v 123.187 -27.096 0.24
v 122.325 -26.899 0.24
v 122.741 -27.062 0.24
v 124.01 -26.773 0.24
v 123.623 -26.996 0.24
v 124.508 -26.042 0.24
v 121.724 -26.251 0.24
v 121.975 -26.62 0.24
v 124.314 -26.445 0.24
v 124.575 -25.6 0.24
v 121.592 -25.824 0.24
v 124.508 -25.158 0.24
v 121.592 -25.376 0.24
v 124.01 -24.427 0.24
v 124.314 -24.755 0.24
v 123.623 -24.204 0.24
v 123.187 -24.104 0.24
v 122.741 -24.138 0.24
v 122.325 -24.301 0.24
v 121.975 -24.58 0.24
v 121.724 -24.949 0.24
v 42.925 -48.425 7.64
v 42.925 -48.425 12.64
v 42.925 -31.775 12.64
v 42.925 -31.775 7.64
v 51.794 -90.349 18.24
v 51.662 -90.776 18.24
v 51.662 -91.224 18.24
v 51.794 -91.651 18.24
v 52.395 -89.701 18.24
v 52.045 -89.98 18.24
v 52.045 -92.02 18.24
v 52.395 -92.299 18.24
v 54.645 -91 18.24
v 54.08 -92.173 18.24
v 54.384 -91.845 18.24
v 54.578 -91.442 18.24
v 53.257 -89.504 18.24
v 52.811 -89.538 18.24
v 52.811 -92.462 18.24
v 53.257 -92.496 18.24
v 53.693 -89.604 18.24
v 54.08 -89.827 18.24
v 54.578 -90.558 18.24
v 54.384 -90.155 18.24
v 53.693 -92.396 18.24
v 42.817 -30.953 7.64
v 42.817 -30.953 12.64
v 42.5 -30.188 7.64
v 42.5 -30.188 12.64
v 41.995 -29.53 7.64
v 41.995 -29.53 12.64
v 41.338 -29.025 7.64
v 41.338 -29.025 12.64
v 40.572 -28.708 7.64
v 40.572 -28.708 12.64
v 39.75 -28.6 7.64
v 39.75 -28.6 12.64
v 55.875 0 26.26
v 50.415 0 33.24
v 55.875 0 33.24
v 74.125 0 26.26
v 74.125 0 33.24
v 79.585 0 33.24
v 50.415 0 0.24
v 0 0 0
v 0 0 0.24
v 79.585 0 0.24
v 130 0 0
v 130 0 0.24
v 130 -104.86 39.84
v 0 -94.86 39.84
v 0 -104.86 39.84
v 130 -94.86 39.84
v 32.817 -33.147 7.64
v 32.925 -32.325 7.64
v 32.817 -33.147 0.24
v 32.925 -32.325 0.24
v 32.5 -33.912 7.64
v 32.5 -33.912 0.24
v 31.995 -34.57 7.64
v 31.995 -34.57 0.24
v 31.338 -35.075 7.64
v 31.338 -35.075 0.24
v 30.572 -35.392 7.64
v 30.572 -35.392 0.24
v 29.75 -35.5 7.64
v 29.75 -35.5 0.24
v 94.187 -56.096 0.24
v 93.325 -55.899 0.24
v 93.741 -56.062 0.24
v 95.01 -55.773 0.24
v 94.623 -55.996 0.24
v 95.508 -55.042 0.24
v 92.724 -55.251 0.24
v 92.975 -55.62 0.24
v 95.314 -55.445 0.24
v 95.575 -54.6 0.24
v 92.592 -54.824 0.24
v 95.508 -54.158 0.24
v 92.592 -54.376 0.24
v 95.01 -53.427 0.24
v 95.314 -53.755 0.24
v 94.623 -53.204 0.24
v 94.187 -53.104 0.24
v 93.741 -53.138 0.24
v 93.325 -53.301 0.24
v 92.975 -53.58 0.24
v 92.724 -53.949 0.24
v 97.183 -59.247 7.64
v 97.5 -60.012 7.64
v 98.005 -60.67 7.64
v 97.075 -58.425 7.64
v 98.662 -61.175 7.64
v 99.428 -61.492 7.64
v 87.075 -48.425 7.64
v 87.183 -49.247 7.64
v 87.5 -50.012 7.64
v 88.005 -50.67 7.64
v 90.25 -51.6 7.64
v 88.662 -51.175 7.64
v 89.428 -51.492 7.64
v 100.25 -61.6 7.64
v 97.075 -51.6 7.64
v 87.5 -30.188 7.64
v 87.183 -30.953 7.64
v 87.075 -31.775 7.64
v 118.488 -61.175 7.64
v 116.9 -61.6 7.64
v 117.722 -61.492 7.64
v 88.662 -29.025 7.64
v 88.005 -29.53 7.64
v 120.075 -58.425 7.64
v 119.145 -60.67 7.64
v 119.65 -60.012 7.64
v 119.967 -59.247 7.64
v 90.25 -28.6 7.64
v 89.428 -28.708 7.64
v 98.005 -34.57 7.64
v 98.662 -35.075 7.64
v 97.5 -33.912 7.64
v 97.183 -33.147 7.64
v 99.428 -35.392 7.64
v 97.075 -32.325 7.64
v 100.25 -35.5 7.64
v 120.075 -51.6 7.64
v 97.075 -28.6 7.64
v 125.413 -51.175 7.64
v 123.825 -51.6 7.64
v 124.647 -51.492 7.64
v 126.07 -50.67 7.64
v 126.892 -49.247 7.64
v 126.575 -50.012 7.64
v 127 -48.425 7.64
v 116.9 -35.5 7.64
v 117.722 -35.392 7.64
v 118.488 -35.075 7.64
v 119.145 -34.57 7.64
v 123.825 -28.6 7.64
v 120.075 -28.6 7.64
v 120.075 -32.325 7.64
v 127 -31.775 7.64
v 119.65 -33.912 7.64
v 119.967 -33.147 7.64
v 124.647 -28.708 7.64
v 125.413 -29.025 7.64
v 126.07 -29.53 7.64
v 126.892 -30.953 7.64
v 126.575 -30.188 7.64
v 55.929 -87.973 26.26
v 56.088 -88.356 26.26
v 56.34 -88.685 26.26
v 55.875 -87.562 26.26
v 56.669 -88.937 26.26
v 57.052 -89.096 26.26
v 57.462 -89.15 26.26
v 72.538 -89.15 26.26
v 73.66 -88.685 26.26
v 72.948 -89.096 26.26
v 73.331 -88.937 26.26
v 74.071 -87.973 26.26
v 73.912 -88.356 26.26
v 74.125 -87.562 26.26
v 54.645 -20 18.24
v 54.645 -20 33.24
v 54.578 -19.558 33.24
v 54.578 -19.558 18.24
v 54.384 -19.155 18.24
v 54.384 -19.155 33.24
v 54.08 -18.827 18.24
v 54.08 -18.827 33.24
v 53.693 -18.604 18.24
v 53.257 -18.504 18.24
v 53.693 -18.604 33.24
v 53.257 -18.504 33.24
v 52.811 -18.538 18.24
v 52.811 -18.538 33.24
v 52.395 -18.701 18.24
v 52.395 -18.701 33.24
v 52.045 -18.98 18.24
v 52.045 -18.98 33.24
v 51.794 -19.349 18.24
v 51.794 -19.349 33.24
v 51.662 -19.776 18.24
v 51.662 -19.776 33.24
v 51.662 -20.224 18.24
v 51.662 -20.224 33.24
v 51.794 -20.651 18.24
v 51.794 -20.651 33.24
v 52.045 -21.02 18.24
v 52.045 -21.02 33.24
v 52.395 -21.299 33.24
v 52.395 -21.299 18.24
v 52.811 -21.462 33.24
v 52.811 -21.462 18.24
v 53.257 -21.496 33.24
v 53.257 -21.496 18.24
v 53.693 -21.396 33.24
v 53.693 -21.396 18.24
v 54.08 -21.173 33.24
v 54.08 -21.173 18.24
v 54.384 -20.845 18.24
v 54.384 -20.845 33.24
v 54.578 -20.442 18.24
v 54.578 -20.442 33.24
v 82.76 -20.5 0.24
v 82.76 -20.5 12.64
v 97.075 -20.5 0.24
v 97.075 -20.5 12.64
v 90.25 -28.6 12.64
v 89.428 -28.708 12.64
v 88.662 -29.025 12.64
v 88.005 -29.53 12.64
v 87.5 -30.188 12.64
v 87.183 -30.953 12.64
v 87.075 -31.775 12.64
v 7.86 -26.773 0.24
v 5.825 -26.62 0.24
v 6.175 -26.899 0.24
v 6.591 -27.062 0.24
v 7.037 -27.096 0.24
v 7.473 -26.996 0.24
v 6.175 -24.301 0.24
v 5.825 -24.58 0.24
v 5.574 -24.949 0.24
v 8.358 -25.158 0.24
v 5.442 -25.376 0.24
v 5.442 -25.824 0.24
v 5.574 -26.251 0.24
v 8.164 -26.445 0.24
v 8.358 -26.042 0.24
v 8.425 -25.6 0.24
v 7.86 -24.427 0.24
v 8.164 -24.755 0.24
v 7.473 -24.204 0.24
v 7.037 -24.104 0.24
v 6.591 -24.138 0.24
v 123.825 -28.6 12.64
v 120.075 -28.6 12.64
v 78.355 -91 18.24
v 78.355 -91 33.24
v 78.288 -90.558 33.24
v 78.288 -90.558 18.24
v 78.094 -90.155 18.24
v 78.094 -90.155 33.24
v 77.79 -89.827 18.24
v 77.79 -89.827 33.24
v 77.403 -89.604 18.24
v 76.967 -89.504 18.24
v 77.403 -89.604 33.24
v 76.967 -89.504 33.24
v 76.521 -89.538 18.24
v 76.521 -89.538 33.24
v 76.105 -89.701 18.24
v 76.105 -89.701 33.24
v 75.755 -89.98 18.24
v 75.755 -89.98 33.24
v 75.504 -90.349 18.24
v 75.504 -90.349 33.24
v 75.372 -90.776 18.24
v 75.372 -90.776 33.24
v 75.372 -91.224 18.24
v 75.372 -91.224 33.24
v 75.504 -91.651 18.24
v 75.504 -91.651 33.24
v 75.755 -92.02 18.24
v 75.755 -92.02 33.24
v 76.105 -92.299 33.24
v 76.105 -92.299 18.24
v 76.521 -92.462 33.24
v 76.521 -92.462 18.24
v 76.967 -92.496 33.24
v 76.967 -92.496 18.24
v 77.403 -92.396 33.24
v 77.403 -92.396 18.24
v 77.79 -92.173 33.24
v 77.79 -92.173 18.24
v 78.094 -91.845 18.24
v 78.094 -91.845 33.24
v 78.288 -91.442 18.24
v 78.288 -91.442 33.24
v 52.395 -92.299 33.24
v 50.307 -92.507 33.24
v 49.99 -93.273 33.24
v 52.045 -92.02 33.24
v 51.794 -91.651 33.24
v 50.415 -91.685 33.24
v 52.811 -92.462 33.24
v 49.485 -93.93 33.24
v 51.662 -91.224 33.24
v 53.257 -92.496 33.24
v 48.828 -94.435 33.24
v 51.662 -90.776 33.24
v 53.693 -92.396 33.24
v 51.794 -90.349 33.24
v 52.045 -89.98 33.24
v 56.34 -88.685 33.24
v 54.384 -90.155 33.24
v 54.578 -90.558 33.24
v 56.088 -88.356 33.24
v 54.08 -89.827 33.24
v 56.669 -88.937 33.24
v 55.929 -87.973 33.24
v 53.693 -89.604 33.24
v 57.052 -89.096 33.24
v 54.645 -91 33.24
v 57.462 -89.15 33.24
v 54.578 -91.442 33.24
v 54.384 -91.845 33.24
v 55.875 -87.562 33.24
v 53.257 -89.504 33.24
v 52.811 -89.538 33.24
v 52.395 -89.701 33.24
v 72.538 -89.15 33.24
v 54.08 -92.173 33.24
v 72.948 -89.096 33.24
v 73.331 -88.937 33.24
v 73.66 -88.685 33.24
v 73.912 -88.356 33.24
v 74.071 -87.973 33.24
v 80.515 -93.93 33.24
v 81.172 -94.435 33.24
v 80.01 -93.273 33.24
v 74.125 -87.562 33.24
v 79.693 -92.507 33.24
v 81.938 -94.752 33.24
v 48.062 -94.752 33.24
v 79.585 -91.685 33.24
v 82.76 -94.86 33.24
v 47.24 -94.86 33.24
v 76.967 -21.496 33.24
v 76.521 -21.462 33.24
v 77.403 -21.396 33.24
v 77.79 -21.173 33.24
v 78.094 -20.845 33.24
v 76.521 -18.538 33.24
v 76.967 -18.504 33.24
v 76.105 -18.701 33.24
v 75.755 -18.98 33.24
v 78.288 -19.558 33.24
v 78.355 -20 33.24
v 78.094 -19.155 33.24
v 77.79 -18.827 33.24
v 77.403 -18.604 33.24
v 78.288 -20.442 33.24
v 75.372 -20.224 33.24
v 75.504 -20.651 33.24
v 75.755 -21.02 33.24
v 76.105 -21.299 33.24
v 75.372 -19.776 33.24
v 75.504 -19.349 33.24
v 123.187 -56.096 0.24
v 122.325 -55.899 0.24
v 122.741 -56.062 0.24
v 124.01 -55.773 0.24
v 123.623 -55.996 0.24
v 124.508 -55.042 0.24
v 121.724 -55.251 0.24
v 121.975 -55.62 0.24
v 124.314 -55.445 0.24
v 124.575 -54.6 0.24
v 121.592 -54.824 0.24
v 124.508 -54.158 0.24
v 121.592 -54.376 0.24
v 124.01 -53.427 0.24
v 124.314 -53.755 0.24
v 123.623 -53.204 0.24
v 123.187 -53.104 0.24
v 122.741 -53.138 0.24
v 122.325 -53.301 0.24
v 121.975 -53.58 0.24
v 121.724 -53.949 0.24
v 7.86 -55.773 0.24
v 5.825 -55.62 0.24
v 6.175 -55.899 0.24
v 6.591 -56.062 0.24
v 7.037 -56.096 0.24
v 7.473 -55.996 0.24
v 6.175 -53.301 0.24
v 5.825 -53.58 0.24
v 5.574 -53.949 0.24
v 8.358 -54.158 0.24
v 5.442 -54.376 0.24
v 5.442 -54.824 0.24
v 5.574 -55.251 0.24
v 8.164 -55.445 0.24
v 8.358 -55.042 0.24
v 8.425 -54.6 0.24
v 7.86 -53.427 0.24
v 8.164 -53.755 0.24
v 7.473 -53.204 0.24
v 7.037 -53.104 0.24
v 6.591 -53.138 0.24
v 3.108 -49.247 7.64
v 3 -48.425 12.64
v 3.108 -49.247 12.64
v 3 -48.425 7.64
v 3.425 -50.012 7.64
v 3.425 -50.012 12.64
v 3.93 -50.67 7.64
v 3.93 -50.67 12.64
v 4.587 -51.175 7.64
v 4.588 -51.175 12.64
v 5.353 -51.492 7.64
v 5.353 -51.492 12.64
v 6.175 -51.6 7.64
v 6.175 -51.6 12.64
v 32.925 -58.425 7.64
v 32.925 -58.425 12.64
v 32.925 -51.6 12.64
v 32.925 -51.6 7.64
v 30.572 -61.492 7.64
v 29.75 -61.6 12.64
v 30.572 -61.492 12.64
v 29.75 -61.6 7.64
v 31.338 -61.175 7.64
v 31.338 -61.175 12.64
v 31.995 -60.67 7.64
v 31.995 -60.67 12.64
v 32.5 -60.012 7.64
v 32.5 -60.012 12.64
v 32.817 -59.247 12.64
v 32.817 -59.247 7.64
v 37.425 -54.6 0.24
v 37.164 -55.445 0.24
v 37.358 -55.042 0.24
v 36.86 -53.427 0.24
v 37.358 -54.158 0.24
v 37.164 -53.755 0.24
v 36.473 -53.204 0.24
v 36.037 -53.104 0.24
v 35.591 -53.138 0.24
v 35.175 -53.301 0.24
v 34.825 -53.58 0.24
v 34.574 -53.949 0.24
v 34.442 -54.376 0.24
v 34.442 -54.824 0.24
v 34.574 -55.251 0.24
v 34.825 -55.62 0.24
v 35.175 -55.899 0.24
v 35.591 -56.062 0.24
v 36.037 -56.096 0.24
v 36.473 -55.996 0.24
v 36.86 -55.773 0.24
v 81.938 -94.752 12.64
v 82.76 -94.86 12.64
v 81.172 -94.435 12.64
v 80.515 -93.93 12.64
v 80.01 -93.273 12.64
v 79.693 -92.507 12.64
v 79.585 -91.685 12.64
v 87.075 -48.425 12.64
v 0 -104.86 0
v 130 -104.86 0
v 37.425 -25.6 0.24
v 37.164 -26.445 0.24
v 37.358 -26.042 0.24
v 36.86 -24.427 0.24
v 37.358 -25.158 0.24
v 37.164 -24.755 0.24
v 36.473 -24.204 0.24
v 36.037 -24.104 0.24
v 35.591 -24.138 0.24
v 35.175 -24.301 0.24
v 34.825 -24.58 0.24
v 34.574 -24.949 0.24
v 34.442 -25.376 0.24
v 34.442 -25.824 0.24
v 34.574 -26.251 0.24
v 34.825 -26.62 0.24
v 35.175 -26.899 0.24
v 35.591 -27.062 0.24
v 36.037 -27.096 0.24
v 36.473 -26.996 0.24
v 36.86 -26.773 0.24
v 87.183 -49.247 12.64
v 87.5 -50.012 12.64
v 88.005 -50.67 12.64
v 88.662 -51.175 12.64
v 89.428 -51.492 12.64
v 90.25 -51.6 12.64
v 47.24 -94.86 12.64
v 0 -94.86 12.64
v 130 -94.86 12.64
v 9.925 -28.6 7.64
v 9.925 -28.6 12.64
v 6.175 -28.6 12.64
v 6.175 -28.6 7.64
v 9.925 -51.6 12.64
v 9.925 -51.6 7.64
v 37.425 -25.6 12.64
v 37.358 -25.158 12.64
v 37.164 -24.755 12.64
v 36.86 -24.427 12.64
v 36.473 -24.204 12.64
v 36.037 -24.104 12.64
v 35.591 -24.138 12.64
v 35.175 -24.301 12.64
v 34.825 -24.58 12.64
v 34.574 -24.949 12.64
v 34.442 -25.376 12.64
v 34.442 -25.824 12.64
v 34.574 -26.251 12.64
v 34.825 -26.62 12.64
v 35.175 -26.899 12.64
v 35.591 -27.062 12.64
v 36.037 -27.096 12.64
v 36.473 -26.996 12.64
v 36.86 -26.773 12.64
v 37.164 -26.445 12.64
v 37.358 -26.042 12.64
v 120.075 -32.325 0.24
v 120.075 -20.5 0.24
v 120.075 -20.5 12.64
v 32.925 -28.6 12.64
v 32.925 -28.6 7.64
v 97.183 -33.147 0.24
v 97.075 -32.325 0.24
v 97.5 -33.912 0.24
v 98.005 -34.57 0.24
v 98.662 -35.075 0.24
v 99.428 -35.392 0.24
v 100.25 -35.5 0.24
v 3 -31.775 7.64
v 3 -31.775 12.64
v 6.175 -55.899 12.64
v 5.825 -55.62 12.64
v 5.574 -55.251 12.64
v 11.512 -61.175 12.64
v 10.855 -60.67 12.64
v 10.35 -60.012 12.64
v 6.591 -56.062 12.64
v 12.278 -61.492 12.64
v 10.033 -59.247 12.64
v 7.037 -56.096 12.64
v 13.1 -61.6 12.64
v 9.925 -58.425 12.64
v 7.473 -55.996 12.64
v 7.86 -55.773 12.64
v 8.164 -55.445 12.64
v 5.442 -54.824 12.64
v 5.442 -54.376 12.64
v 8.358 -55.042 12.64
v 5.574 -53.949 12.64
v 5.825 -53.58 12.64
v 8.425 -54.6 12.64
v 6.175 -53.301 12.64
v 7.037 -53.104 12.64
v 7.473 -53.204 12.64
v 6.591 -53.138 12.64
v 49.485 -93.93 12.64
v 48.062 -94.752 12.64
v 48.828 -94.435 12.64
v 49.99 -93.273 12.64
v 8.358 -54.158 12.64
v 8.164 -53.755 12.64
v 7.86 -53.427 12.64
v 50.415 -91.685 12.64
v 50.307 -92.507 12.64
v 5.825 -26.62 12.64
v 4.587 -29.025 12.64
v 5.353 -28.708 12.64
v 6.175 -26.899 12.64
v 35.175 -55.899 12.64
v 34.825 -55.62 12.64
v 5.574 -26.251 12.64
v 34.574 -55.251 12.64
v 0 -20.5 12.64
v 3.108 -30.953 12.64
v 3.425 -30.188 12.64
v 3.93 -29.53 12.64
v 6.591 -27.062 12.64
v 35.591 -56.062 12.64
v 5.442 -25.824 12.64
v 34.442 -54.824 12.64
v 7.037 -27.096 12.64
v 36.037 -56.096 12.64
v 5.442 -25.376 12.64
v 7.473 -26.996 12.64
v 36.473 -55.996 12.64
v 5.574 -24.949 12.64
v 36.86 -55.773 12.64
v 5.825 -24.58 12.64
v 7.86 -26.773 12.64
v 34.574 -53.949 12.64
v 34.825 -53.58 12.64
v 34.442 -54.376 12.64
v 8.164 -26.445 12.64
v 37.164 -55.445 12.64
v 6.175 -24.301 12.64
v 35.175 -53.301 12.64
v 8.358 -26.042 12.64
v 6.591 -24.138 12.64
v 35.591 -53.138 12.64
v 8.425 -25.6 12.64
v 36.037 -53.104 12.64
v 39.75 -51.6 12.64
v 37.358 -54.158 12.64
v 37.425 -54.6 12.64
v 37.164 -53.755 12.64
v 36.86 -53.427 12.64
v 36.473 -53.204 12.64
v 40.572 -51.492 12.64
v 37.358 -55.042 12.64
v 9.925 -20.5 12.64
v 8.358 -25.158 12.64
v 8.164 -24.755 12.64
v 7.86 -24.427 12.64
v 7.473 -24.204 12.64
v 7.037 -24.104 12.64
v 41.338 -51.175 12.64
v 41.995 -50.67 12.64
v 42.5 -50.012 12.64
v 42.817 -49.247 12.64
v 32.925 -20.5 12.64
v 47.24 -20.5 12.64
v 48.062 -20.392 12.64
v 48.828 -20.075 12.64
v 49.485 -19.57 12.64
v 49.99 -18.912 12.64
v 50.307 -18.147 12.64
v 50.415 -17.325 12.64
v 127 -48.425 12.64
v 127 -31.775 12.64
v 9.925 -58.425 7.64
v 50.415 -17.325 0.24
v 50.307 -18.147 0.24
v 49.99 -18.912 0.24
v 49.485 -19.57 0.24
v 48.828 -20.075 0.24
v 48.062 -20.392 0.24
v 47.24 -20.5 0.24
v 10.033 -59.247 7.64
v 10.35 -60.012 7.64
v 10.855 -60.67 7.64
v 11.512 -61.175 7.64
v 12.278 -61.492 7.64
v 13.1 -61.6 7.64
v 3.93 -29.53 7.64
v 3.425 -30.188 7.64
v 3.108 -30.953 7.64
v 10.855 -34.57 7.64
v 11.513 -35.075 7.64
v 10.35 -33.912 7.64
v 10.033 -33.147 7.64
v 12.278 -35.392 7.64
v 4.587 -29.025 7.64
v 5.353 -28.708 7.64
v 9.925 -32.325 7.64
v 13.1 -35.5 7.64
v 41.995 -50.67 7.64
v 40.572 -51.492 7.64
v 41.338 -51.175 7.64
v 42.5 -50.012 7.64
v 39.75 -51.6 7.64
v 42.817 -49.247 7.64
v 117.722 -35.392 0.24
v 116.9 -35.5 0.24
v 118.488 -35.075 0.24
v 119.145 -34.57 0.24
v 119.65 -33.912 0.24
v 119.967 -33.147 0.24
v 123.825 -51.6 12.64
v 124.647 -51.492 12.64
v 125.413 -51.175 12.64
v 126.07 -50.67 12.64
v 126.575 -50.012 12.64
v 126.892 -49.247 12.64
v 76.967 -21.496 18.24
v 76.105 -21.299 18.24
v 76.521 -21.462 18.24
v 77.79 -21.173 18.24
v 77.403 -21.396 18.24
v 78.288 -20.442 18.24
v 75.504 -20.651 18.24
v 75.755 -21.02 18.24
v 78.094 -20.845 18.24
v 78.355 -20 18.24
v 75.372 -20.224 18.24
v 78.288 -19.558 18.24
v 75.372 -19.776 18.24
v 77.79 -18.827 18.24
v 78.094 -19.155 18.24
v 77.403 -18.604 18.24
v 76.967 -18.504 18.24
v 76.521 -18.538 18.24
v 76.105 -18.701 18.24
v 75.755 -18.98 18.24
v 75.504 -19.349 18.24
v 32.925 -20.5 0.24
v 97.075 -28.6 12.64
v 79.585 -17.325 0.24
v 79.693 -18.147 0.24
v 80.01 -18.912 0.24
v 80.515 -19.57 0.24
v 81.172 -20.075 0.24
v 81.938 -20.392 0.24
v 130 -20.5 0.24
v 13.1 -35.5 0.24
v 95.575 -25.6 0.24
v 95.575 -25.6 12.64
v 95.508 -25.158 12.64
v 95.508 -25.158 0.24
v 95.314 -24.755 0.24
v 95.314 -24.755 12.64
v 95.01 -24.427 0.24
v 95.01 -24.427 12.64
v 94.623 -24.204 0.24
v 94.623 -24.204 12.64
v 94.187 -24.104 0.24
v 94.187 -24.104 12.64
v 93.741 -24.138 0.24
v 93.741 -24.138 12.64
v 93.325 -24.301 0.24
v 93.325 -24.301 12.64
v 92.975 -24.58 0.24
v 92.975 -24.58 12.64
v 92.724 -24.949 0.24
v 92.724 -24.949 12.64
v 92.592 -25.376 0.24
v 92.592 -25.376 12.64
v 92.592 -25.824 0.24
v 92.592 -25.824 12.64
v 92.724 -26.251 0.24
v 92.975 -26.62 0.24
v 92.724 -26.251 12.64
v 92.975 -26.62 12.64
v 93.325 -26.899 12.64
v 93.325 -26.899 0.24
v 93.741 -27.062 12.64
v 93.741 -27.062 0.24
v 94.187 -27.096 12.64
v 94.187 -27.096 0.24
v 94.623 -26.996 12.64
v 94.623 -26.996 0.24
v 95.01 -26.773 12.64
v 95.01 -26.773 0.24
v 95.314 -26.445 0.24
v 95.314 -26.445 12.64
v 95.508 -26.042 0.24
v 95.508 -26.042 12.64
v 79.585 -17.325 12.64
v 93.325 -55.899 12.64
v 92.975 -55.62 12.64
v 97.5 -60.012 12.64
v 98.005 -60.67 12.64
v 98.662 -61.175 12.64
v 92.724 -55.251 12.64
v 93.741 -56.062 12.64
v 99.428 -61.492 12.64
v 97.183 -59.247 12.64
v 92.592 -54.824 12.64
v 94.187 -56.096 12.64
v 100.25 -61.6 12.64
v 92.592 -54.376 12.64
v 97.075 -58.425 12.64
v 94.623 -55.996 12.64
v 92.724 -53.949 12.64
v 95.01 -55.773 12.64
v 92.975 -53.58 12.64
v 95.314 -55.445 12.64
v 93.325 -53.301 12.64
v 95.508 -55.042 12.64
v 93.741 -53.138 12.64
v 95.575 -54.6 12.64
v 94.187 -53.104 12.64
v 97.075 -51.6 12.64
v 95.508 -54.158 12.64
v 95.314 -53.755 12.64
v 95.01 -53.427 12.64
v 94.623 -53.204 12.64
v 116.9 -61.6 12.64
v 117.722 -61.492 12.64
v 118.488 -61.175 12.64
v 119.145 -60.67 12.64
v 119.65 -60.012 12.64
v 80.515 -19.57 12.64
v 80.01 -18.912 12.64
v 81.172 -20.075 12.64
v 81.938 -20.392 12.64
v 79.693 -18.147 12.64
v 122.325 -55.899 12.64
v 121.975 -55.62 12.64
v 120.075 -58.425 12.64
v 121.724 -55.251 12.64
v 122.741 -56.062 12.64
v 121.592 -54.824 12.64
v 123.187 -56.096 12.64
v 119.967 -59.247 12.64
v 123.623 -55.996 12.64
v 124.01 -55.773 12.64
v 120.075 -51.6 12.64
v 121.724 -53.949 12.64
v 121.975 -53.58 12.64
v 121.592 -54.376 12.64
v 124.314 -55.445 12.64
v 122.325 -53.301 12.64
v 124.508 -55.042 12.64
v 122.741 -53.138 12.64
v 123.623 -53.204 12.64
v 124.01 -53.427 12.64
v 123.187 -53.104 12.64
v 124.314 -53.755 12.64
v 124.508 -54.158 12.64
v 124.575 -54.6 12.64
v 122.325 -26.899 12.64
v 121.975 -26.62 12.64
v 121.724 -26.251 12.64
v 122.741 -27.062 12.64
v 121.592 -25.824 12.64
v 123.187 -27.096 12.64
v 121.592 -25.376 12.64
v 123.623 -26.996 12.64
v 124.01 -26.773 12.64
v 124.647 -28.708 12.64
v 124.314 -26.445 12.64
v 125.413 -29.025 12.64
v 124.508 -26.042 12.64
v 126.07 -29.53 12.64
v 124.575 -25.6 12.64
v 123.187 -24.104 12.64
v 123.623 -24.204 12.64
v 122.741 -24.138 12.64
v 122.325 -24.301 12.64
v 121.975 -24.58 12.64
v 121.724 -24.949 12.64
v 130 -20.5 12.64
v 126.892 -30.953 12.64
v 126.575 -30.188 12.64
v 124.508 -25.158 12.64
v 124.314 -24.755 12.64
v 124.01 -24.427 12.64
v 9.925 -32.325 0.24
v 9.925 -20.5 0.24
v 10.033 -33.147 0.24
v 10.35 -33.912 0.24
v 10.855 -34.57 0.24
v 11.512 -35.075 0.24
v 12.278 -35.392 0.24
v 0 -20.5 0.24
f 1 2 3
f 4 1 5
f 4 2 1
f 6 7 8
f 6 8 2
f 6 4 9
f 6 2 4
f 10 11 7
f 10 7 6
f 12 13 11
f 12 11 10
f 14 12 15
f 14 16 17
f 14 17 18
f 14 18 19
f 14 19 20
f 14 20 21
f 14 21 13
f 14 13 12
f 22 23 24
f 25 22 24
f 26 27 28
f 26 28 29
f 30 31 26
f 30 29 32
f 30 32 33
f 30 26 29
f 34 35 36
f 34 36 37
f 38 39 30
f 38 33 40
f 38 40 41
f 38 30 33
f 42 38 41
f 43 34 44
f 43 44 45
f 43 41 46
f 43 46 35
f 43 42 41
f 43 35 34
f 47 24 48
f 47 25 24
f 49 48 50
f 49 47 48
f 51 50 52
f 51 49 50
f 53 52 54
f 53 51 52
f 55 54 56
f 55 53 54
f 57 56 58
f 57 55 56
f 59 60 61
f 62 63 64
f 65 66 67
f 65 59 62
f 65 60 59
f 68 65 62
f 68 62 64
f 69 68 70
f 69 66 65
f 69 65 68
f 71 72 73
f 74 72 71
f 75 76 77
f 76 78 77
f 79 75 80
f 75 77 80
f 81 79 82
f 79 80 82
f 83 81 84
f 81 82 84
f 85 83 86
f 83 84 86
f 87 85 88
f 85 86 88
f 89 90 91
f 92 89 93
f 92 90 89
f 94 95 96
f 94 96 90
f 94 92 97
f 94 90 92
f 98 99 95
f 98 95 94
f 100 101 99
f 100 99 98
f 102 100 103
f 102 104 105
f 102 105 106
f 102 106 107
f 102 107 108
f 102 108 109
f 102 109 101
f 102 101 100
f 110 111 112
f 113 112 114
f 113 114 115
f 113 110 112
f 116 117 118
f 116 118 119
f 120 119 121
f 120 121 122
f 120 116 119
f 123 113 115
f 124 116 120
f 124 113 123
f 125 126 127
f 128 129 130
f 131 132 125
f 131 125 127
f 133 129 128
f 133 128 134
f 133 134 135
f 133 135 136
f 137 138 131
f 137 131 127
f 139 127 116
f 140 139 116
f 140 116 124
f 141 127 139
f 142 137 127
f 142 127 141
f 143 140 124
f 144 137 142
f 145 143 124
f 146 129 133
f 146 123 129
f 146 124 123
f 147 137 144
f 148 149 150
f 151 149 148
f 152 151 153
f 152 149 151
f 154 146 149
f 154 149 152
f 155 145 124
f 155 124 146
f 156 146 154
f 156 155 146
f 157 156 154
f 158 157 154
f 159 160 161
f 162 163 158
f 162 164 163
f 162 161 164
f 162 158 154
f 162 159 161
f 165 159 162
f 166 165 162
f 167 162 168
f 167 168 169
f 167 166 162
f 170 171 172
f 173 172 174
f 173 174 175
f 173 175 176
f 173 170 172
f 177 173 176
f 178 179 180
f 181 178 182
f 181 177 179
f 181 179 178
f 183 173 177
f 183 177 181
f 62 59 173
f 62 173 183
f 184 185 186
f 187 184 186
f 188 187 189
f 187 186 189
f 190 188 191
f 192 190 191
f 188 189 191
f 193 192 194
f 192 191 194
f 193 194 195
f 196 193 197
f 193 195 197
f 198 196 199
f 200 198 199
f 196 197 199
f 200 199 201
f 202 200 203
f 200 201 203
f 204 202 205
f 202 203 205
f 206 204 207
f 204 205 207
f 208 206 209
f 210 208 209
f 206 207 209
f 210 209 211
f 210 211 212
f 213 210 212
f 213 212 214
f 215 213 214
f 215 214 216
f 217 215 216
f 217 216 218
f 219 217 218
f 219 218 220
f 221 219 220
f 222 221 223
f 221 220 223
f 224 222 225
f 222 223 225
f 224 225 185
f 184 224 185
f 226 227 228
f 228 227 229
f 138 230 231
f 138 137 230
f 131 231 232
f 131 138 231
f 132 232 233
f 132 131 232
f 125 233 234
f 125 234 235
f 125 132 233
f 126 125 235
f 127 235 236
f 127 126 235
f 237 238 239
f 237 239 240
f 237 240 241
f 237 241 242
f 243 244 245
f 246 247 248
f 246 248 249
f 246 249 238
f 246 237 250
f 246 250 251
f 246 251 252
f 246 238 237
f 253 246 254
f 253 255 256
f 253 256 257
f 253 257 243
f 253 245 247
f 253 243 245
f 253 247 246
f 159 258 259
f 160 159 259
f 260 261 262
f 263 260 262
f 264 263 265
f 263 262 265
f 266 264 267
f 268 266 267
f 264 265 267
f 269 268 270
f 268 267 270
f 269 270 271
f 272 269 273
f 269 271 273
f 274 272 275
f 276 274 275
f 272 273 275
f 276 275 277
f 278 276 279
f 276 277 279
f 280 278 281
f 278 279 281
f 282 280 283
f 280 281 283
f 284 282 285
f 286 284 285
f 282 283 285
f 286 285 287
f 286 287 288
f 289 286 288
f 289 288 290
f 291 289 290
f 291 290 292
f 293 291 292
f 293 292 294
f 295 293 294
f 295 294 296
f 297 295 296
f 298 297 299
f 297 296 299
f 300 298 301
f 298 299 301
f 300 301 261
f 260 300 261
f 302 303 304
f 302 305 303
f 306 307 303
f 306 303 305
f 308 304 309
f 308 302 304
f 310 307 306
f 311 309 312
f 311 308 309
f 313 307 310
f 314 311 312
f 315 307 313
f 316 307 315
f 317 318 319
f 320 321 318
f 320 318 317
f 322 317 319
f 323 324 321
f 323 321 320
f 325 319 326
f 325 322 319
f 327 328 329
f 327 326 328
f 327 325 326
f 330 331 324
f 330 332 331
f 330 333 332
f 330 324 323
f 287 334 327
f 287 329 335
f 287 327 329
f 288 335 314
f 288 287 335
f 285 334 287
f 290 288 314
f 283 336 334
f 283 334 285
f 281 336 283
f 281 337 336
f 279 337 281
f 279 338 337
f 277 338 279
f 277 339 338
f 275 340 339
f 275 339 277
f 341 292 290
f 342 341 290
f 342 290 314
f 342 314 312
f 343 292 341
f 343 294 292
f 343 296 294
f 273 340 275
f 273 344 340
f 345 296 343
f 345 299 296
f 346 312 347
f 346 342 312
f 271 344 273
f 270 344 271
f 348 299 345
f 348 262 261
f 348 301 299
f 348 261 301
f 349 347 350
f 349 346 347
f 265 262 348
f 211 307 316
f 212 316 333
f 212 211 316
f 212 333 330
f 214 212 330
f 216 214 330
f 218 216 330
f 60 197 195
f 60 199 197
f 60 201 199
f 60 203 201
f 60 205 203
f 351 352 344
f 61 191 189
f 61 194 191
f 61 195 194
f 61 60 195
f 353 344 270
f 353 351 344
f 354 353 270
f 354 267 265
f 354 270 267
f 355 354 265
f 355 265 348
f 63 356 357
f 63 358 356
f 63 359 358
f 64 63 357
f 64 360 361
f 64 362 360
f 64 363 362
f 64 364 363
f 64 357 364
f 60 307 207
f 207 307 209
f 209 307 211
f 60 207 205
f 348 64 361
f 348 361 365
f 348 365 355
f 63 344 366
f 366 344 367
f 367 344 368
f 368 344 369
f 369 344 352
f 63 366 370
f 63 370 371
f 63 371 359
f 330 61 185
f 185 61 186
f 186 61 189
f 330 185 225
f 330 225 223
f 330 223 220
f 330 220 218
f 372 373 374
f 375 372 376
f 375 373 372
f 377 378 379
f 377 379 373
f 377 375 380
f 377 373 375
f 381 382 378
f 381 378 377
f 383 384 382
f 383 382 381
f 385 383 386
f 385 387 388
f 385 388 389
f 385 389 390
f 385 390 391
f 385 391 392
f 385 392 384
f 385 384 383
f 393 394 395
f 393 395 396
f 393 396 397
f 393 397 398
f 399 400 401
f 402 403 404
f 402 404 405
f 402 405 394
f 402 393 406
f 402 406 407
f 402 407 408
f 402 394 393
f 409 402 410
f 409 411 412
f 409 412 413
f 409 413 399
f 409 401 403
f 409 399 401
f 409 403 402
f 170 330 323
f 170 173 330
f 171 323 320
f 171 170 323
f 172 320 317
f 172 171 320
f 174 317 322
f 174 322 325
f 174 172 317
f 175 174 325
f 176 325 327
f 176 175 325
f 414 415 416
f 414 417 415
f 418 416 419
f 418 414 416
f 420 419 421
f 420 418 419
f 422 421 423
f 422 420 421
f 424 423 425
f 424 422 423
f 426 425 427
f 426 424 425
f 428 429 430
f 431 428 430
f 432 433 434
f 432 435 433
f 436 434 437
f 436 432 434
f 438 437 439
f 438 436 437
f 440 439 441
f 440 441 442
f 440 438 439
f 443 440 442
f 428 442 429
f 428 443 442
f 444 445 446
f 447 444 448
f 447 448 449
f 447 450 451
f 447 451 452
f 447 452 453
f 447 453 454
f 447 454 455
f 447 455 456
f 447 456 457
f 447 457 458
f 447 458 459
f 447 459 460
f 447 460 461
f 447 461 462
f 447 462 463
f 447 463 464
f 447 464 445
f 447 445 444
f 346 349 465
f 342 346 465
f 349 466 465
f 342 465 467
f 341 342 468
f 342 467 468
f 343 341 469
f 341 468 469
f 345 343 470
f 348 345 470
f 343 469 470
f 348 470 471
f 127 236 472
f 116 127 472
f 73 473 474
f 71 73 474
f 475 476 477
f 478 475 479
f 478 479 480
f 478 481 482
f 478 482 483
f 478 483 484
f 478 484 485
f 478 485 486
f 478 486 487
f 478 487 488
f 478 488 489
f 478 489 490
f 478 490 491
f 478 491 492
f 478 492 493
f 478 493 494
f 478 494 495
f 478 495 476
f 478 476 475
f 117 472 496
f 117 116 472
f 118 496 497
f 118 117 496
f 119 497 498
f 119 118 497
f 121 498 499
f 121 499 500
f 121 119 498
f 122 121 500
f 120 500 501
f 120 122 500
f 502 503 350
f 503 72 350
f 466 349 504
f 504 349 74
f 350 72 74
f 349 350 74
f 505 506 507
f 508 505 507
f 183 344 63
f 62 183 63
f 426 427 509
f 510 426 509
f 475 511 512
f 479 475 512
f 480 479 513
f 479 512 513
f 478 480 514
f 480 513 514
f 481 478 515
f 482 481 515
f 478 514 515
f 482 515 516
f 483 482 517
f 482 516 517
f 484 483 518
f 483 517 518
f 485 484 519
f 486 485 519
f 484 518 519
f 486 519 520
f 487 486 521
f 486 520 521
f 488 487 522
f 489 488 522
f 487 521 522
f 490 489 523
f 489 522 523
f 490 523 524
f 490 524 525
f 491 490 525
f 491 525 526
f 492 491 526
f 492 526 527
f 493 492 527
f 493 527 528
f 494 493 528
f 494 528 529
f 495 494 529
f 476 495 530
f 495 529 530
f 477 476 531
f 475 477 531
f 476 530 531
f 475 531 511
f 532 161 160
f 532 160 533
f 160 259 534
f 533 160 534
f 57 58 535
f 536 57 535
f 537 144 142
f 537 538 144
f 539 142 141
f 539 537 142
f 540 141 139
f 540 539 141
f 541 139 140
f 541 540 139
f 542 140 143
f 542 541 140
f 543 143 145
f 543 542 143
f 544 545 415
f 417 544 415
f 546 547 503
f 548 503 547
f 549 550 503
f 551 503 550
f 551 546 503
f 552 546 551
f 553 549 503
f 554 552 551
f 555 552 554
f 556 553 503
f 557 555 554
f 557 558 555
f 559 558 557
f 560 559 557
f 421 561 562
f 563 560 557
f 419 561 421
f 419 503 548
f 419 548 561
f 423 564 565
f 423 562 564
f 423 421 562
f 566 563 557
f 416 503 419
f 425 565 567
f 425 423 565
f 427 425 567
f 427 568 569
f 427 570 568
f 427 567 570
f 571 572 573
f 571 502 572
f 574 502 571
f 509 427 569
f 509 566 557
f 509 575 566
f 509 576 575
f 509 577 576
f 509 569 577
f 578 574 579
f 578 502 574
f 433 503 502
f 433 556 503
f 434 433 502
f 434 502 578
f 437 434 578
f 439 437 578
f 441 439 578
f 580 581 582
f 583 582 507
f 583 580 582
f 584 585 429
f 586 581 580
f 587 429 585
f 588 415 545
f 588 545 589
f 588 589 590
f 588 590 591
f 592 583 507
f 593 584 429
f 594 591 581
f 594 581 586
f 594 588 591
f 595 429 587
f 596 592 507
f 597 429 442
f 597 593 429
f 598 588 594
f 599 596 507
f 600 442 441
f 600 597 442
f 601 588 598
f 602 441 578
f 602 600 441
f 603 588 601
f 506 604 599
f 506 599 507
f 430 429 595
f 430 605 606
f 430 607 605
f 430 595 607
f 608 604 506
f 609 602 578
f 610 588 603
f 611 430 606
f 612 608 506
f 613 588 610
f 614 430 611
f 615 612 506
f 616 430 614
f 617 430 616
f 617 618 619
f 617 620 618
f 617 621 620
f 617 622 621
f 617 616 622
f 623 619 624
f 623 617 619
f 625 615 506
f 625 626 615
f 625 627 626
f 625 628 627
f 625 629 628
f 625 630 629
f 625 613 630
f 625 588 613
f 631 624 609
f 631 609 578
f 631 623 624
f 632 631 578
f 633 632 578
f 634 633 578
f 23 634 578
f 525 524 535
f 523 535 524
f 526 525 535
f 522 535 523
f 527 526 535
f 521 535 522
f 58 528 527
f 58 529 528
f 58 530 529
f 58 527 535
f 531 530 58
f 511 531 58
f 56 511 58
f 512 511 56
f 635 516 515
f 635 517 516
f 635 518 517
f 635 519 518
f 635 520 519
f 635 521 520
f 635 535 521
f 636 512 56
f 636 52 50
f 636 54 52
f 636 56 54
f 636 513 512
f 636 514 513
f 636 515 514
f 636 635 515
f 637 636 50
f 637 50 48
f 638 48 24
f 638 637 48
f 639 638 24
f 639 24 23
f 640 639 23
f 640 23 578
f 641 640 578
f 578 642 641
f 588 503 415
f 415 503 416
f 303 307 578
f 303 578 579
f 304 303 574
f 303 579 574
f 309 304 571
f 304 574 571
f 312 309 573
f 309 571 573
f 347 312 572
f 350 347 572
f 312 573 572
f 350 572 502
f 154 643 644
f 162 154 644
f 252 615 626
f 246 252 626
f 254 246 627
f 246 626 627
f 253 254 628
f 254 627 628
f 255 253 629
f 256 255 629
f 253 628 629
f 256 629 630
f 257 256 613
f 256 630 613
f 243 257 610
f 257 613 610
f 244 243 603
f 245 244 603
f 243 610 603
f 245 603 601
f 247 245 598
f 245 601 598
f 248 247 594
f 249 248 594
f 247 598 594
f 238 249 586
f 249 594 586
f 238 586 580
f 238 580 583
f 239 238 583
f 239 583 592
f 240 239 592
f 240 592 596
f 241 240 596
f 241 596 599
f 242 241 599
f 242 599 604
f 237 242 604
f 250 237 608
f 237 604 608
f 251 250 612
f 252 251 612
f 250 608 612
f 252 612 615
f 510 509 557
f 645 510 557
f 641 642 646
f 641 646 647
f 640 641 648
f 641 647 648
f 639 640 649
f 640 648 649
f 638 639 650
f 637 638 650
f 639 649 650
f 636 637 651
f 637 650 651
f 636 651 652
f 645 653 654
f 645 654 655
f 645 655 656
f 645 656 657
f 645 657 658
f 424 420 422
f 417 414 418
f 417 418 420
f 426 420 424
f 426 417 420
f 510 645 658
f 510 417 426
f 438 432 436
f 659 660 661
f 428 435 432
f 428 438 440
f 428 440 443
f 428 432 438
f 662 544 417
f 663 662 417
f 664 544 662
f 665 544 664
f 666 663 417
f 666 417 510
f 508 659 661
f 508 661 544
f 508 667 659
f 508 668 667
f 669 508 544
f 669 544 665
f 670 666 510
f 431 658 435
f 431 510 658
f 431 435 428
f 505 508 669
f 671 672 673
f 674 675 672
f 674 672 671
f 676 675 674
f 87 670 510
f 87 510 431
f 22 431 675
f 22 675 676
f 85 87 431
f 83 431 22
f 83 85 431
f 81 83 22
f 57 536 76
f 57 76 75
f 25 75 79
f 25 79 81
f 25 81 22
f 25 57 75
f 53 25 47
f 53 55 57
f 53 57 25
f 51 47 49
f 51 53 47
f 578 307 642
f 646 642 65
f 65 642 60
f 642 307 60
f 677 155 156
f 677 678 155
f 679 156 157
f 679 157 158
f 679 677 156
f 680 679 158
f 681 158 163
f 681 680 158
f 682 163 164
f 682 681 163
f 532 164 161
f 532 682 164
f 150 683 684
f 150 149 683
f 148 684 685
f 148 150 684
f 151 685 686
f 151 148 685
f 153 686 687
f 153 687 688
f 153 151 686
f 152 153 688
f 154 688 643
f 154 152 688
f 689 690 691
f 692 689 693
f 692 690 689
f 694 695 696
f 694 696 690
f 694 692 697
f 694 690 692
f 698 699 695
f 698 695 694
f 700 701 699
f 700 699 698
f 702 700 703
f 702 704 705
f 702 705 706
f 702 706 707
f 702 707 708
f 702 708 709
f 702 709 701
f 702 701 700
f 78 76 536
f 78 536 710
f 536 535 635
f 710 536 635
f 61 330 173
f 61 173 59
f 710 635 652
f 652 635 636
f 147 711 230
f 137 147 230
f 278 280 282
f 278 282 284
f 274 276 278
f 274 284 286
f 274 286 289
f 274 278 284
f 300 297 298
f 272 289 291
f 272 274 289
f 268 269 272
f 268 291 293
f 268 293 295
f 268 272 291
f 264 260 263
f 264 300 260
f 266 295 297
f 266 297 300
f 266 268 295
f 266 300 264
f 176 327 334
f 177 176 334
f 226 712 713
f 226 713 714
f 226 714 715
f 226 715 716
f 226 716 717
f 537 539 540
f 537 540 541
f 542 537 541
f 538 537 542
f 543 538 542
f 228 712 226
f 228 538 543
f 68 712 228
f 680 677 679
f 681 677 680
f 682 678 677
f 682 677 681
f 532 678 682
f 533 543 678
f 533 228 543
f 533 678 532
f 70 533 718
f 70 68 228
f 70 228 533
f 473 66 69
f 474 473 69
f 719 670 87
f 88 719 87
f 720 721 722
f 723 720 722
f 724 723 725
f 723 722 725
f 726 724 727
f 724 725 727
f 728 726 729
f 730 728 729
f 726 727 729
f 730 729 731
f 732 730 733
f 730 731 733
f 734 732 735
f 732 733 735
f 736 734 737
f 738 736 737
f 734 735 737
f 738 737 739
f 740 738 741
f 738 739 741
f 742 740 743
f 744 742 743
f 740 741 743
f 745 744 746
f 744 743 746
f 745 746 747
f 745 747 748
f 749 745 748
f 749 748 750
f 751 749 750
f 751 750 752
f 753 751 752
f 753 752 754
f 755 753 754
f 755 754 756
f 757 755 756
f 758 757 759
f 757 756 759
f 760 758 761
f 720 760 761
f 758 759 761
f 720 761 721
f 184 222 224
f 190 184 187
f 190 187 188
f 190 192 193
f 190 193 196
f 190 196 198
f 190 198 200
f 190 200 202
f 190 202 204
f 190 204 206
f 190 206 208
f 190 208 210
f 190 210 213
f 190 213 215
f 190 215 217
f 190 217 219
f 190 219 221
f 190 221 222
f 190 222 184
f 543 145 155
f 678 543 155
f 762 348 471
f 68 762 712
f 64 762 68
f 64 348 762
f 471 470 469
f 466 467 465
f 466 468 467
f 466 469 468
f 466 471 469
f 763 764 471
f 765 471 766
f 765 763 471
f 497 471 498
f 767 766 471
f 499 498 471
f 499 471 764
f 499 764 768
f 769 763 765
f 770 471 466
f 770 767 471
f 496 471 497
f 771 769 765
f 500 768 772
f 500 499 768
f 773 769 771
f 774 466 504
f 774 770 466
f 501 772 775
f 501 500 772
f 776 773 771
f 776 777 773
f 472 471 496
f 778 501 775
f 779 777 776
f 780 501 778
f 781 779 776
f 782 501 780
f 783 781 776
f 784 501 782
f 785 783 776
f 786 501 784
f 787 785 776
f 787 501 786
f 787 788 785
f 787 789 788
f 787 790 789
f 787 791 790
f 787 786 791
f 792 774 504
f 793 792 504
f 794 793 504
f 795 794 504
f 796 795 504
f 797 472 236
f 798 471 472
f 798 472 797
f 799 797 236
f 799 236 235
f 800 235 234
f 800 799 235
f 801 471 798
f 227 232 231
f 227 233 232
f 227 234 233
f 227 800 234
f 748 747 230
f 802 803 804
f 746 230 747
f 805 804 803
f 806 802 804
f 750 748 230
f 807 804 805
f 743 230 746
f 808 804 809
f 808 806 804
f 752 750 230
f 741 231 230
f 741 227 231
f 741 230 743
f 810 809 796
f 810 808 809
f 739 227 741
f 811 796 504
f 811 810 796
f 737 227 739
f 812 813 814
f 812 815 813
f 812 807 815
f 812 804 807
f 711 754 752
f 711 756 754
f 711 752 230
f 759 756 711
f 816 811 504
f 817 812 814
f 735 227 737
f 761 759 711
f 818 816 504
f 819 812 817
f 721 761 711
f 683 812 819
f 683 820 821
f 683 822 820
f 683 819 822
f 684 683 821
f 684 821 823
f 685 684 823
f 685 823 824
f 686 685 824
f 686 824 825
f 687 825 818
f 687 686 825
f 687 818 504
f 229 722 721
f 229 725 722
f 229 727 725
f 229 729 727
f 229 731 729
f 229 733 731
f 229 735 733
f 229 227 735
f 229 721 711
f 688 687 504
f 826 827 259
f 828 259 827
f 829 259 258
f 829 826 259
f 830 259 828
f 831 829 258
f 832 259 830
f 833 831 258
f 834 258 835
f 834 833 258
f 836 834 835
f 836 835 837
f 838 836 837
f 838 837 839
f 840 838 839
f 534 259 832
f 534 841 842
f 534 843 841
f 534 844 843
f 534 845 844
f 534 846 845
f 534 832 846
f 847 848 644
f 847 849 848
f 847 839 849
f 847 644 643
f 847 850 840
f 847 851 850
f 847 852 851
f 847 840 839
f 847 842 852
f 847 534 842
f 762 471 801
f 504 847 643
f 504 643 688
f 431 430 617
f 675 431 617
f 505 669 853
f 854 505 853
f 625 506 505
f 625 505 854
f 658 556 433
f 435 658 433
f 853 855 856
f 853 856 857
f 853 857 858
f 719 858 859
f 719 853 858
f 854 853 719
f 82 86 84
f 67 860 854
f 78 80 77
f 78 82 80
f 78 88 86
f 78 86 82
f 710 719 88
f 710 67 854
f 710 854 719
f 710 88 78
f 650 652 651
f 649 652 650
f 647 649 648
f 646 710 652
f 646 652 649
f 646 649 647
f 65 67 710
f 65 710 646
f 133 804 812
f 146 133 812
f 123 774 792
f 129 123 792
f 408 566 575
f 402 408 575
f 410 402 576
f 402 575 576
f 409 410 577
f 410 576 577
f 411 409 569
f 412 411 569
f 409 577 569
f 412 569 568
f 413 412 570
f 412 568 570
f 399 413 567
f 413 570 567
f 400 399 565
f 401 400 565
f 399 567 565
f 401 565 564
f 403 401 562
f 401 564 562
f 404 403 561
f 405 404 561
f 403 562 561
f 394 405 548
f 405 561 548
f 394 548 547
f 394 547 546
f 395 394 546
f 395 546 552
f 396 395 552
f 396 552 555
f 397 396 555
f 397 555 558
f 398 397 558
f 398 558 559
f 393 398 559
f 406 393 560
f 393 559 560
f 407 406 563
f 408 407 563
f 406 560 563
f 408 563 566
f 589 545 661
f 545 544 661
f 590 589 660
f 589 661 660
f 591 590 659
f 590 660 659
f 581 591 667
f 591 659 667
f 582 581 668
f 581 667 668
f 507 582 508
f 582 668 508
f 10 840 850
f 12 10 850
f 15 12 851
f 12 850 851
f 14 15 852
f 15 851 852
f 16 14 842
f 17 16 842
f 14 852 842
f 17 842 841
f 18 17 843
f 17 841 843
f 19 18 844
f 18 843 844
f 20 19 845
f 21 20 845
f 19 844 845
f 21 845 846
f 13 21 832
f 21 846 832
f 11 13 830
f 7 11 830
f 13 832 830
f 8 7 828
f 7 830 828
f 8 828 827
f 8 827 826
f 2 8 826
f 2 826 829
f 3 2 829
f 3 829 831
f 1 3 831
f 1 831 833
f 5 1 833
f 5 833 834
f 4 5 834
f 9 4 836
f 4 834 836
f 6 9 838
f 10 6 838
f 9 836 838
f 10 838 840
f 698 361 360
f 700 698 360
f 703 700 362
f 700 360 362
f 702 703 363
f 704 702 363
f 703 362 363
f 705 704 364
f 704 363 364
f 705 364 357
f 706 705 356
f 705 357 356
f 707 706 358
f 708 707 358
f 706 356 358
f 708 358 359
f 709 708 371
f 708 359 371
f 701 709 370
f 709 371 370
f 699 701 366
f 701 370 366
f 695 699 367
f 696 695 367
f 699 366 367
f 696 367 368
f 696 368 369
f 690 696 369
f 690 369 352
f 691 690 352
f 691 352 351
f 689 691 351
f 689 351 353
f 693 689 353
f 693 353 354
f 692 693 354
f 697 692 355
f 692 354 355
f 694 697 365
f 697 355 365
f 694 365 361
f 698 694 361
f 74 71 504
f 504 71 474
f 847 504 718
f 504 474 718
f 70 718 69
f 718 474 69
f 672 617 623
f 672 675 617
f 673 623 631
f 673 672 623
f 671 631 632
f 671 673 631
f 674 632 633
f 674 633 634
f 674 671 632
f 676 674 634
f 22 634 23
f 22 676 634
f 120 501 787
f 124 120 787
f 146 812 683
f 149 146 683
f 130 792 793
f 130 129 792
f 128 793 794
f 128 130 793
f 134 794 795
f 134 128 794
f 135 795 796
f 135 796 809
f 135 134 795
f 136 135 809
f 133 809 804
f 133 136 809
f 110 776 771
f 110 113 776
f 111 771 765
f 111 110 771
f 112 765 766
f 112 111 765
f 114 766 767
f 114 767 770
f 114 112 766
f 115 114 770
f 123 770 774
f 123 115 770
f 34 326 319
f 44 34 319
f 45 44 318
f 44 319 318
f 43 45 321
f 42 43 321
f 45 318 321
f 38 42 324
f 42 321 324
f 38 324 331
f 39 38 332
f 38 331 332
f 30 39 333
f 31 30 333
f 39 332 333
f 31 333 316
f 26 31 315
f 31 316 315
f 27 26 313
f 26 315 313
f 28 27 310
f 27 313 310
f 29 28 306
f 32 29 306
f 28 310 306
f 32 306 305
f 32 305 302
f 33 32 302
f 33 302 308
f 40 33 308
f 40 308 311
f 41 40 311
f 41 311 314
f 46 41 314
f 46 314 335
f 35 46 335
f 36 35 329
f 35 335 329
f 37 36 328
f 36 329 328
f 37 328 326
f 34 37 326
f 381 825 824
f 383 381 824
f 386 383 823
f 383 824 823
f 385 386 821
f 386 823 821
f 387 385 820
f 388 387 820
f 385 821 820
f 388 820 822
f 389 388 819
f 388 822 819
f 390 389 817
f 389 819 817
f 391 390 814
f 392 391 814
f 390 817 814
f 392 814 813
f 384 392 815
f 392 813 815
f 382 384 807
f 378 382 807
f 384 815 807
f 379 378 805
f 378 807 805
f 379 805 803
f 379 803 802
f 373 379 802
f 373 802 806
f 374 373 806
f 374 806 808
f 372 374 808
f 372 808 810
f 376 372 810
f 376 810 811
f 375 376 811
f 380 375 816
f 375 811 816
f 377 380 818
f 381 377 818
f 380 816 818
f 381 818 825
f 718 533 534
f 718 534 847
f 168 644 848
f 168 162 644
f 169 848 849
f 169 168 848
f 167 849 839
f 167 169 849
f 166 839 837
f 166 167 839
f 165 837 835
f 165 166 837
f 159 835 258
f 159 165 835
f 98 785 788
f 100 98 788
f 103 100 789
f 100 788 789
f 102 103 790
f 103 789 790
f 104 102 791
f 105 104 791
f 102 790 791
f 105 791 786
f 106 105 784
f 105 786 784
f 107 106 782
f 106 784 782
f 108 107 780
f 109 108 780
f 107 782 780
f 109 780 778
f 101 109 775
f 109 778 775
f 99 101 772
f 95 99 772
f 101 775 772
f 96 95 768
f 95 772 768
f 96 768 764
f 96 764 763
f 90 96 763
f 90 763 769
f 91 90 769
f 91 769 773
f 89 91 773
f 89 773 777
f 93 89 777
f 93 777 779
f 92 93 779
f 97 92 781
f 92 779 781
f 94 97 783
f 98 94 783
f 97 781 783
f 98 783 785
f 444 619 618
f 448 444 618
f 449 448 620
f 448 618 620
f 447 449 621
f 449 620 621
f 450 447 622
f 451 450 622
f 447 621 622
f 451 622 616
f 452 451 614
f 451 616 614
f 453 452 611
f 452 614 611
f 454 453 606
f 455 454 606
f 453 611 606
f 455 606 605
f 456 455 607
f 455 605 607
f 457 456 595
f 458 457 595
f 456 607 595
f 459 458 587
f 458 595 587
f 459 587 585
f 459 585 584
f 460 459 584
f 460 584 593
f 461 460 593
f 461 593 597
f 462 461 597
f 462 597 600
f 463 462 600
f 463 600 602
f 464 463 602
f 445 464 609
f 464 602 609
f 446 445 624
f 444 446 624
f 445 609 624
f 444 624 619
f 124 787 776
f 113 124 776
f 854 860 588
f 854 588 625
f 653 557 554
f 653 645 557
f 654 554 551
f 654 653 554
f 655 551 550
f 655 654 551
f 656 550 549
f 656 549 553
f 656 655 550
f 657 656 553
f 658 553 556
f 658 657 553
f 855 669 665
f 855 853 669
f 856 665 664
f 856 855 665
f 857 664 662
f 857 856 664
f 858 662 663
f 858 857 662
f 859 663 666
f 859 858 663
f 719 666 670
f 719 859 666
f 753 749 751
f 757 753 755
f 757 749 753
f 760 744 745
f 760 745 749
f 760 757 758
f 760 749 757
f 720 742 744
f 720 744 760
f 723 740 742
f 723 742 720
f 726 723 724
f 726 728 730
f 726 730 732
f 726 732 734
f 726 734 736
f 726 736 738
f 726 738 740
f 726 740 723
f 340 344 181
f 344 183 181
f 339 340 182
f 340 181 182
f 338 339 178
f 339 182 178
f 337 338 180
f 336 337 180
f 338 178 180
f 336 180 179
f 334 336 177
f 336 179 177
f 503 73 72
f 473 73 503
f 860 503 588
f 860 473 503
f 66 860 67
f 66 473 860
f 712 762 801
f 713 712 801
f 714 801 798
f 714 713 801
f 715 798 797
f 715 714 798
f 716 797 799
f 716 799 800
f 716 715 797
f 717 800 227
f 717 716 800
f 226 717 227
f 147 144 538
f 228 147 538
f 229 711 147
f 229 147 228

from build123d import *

# Parameters (mm, degrees)
SKETCH1_W           = 130
SKETCH1_H           = 104.86
BOSS_EXTRUDE1_DEPTH = 39.84
SKETCH2_W           = 130
SKETCH2_H           = 94.86
CUT_EXTRUDE1_DEPTH  = 6.6
SKETCH3_W           = 18.25
SKETCH3_H           = 89.15
CUT_EXTRUDE2_DEPTH  = 6.98
SKETCH5_W           = 50.415
SKETCH5_H           = 94.86
CUT_EXTRUDE3_DEPTH  = 20.6
SKETCH6_R           = 1.5
CUT_EXTRUDE4_DEPTH  = 12.4
SKETCH7_W           = 50.415
SKETCH7_H           = 20.5
CUT_EXTRUDE5_DEPTH  = 12.4
SKETCH9_W           = 23
SKETCH9_H           = 15
CUT_EXTRUDE7_DEPTH  = 12.4
CUT_EXTRUDE8_DEPTH  = 5
SKETCH11_R          = 1.5
CUT_EXTRUDE9_DEPTH  = 15
FILLET2_R           = 3.175
FILLET3_R           = 3.175
FILLET4_R           = 3.175
FILLET5_R           = 1.5875
FILLET6_R           = 3.175


with BuildPart() as part:
    # Sketch1 → Boss-Extrude1 (new body)
    with BuildSketch(Plane.XY):
        with Locations((65, -52.43)):
            Rectangle(SKETCH1_W, SKETCH1_H)
    extrude(amount=BOSS_EXTRUDE1_DEPTH)

    # Sketch2 → Cut-Extrude1 (cut)
    with BuildSketch(Plane.XY.offset(39.84)):
        with Locations((65, -47.43)):
            Rectangle(SKETCH2_W, SKETCH2_H)
    extrude(amount=-CUT_EXTRUDE1_DEPTH, mode=Mode.SUBTRACT)

    # Sketch3 → Cut-Extrude2 (cut)
    with BuildSketch(Plane.XY.offset(33.24)):
        with Locations((65, -44.575)):
            Rectangle(SKETCH3_W, SKETCH3_H)
    extrude(amount=-CUT_EXTRUDE2_DEPTH, mode=Mode.SUBTRACT)

    # Sketch5 → Cut-Extrude3 (cut)
    with BuildSketch(Plane.XY.offset(33.24)):
        with Locations((104.7925, -47.43)):
            Rectangle(SKETCH5_W, SKETCH5_H)
        with Locations((25.2075, -47.43)):
            Rectangle(SKETCH5_W, SKETCH5_H)
    extrude(amount=-CUT_EXTRUDE3_DEPTH, mode=Mode.SUBTRACT)

    # Sketch6 → Cut-Extrude4 (cut)
    with BuildSketch(Plane.XY.offset(12.64)):
        with Locations((35.925, -25.6)):
            Circle(SKETCH6_R)
        with Locations((6.925, -25.6)):
            Circle(SKETCH6_R)
        with Locations((35.925, -54.6)):
            Circle(SKETCH6_R)
        with Locations((6.925, -54.6)):
            Circle(SKETCH6_R)
        with Locations((94.075, -25.6)):
            Circle(SKETCH6_R)
        with Locations((123.075, -25.6)):
            Circle(SKETCH6_R)
        with Locations((94.075, -54.6)):
            Circle(SKETCH6_R)
        with Locations((123.075, -54.6)):
            Circle(SKETCH6_R)
    extrude(amount=-CUT_EXTRUDE4_DEPTH, mode=Mode.SUBTRACT)

    # Sketch7 → Cut-Extrude5 (cut)
    with BuildSketch(Plane.XY.offset(12.64)):
        with Locations((25.2075, -10.25)):
            Rectangle(SKETCH7_W, SKETCH7_H)
        with Locations((104.7925, -10.25)):
            Rectangle(SKETCH7_W, SKETCH7_H)
    extrude(amount=-CUT_EXTRUDE5_DEPTH, mode=Mode.SUBTRACT)

    # Sketch9 → Cut-Extrude7 (cut)
    with BuildSketch(Plane.XY.offset(12.64)):
        with Locations((108.575, -28)):
            Rectangle(SKETCH9_W, SKETCH9_H)
        with Locations((21.425, -28)):
            Rectangle(SKETCH9_W, SKETCH9_H)
    extrude(amount=-CUT_EXTRUDE7_DEPTH, mode=Mode.SUBTRACT)

    # Sketch10 → Cut-Extrude8 (cut)
    with BuildSketch(Plane.XY.offset(12.64)):
        Polygon((9.925, -28.6), (3, -28.6), (3, -51.6), (9.925, -51.6), (9.925, -61.6), (32.925, -61.6), (32.925, -51.6), (42.925, -51.6), (42.925, -28.6), (32.925, -28.6), (32.925, -35.5), (9.925, -35.5), align=None)
        Polygon((97.075, -28.6), (87.075, -28.6), (87.075, -51.6), (97.075, -51.6), (97.075, -61.6), (120.075, -61.6), (120.075, -51.6), (127, -51.6), (127, -28.6), (120.075, -28.6), (120.075, -35.5), (97.075, -35.5), align=None)
    extrude(amount=-CUT_EXTRUDE8_DEPTH, mode=Mode.SUBTRACT)

    # Sketch11 → Cut-Extrude9 (cut)
    with BuildSketch(Plane.XY.offset(33.24)):
        with Locations((53.145, -20)):
            Circle(SKETCH11_R)
        with Locations((76.855, -20)):
            Circle(SKETCH11_R)
        with Locations((53.145, -91)):
            Circle(SKETCH11_R)
        with Locations((76.855, -91)):
            Circle(SKETCH11_R)
    extrude(amount=-CUT_EXTRUDE9_DEPTH, mode=Mode.SUBTRACT)

    # Fillet2
    fillet2_edges = [part.edges().sort_by_distance(p)[0] for p in [
        (3, -51.6, 10.14),
    ]]
    fillet(fillet2_edges, radius=FILLET2_R)

    # Fillet3
    fillet3_edges = [part.edges().sort_by_distance(p)[0] for p in [
        (50.415, -20.5, 6.44),
        (79.585, -20.5, 6.44),
        (32.925, -35.5, 3.94),
        (9.925, -35.5, 3.94),
        (42.925, -28.6, 10.14),
        (42.925, -51.6, 10.14),
        (32.925, -61.6, 10.14),
        (9.925, -61.6, 10.14),
        (3, -28.6, 10.14),
        (127, -28.6, 10.14),
        (127, -51.6, 10.14),
        (120.075, -61.6, 10.14),
        (97.075, -61.6, 10.14),
        (87.075, -51.6, 10.14),
        (87.075, -28.6, 10.14),
    ]]
    fillet(fillet3_edges, radius=FILLET3_R)

    # Fillet4
    fillet4_edges = [part.edges().sort_by_distance(p)[0] for p in [
        (120.075, -35.5, 3.94),
        (97.075, -35.5, 3.94),
    ]]
    fillet(fillet4_edges, radius=FILLET4_R)

    # Fillet5
    fillet5_edges = [part.edges().sort_by_distance(p)[0] for p in [
        (74.125, -89.15, 29.75),
        (55.875, -89.15, 29.75),
    ]]
    fillet(fillet5_edges, radius=FILLET5_R)

    # Fillet6
    fillet6_edges = [part.edges().sort_by_distance(p)[0] for p in [
        (79.585, -94.86, 22.94),
        (50.415, -94.86, 22.94),
    ]]
    fillet(fillet6_edges, radius=FILLET6_R)


solid = part.part
